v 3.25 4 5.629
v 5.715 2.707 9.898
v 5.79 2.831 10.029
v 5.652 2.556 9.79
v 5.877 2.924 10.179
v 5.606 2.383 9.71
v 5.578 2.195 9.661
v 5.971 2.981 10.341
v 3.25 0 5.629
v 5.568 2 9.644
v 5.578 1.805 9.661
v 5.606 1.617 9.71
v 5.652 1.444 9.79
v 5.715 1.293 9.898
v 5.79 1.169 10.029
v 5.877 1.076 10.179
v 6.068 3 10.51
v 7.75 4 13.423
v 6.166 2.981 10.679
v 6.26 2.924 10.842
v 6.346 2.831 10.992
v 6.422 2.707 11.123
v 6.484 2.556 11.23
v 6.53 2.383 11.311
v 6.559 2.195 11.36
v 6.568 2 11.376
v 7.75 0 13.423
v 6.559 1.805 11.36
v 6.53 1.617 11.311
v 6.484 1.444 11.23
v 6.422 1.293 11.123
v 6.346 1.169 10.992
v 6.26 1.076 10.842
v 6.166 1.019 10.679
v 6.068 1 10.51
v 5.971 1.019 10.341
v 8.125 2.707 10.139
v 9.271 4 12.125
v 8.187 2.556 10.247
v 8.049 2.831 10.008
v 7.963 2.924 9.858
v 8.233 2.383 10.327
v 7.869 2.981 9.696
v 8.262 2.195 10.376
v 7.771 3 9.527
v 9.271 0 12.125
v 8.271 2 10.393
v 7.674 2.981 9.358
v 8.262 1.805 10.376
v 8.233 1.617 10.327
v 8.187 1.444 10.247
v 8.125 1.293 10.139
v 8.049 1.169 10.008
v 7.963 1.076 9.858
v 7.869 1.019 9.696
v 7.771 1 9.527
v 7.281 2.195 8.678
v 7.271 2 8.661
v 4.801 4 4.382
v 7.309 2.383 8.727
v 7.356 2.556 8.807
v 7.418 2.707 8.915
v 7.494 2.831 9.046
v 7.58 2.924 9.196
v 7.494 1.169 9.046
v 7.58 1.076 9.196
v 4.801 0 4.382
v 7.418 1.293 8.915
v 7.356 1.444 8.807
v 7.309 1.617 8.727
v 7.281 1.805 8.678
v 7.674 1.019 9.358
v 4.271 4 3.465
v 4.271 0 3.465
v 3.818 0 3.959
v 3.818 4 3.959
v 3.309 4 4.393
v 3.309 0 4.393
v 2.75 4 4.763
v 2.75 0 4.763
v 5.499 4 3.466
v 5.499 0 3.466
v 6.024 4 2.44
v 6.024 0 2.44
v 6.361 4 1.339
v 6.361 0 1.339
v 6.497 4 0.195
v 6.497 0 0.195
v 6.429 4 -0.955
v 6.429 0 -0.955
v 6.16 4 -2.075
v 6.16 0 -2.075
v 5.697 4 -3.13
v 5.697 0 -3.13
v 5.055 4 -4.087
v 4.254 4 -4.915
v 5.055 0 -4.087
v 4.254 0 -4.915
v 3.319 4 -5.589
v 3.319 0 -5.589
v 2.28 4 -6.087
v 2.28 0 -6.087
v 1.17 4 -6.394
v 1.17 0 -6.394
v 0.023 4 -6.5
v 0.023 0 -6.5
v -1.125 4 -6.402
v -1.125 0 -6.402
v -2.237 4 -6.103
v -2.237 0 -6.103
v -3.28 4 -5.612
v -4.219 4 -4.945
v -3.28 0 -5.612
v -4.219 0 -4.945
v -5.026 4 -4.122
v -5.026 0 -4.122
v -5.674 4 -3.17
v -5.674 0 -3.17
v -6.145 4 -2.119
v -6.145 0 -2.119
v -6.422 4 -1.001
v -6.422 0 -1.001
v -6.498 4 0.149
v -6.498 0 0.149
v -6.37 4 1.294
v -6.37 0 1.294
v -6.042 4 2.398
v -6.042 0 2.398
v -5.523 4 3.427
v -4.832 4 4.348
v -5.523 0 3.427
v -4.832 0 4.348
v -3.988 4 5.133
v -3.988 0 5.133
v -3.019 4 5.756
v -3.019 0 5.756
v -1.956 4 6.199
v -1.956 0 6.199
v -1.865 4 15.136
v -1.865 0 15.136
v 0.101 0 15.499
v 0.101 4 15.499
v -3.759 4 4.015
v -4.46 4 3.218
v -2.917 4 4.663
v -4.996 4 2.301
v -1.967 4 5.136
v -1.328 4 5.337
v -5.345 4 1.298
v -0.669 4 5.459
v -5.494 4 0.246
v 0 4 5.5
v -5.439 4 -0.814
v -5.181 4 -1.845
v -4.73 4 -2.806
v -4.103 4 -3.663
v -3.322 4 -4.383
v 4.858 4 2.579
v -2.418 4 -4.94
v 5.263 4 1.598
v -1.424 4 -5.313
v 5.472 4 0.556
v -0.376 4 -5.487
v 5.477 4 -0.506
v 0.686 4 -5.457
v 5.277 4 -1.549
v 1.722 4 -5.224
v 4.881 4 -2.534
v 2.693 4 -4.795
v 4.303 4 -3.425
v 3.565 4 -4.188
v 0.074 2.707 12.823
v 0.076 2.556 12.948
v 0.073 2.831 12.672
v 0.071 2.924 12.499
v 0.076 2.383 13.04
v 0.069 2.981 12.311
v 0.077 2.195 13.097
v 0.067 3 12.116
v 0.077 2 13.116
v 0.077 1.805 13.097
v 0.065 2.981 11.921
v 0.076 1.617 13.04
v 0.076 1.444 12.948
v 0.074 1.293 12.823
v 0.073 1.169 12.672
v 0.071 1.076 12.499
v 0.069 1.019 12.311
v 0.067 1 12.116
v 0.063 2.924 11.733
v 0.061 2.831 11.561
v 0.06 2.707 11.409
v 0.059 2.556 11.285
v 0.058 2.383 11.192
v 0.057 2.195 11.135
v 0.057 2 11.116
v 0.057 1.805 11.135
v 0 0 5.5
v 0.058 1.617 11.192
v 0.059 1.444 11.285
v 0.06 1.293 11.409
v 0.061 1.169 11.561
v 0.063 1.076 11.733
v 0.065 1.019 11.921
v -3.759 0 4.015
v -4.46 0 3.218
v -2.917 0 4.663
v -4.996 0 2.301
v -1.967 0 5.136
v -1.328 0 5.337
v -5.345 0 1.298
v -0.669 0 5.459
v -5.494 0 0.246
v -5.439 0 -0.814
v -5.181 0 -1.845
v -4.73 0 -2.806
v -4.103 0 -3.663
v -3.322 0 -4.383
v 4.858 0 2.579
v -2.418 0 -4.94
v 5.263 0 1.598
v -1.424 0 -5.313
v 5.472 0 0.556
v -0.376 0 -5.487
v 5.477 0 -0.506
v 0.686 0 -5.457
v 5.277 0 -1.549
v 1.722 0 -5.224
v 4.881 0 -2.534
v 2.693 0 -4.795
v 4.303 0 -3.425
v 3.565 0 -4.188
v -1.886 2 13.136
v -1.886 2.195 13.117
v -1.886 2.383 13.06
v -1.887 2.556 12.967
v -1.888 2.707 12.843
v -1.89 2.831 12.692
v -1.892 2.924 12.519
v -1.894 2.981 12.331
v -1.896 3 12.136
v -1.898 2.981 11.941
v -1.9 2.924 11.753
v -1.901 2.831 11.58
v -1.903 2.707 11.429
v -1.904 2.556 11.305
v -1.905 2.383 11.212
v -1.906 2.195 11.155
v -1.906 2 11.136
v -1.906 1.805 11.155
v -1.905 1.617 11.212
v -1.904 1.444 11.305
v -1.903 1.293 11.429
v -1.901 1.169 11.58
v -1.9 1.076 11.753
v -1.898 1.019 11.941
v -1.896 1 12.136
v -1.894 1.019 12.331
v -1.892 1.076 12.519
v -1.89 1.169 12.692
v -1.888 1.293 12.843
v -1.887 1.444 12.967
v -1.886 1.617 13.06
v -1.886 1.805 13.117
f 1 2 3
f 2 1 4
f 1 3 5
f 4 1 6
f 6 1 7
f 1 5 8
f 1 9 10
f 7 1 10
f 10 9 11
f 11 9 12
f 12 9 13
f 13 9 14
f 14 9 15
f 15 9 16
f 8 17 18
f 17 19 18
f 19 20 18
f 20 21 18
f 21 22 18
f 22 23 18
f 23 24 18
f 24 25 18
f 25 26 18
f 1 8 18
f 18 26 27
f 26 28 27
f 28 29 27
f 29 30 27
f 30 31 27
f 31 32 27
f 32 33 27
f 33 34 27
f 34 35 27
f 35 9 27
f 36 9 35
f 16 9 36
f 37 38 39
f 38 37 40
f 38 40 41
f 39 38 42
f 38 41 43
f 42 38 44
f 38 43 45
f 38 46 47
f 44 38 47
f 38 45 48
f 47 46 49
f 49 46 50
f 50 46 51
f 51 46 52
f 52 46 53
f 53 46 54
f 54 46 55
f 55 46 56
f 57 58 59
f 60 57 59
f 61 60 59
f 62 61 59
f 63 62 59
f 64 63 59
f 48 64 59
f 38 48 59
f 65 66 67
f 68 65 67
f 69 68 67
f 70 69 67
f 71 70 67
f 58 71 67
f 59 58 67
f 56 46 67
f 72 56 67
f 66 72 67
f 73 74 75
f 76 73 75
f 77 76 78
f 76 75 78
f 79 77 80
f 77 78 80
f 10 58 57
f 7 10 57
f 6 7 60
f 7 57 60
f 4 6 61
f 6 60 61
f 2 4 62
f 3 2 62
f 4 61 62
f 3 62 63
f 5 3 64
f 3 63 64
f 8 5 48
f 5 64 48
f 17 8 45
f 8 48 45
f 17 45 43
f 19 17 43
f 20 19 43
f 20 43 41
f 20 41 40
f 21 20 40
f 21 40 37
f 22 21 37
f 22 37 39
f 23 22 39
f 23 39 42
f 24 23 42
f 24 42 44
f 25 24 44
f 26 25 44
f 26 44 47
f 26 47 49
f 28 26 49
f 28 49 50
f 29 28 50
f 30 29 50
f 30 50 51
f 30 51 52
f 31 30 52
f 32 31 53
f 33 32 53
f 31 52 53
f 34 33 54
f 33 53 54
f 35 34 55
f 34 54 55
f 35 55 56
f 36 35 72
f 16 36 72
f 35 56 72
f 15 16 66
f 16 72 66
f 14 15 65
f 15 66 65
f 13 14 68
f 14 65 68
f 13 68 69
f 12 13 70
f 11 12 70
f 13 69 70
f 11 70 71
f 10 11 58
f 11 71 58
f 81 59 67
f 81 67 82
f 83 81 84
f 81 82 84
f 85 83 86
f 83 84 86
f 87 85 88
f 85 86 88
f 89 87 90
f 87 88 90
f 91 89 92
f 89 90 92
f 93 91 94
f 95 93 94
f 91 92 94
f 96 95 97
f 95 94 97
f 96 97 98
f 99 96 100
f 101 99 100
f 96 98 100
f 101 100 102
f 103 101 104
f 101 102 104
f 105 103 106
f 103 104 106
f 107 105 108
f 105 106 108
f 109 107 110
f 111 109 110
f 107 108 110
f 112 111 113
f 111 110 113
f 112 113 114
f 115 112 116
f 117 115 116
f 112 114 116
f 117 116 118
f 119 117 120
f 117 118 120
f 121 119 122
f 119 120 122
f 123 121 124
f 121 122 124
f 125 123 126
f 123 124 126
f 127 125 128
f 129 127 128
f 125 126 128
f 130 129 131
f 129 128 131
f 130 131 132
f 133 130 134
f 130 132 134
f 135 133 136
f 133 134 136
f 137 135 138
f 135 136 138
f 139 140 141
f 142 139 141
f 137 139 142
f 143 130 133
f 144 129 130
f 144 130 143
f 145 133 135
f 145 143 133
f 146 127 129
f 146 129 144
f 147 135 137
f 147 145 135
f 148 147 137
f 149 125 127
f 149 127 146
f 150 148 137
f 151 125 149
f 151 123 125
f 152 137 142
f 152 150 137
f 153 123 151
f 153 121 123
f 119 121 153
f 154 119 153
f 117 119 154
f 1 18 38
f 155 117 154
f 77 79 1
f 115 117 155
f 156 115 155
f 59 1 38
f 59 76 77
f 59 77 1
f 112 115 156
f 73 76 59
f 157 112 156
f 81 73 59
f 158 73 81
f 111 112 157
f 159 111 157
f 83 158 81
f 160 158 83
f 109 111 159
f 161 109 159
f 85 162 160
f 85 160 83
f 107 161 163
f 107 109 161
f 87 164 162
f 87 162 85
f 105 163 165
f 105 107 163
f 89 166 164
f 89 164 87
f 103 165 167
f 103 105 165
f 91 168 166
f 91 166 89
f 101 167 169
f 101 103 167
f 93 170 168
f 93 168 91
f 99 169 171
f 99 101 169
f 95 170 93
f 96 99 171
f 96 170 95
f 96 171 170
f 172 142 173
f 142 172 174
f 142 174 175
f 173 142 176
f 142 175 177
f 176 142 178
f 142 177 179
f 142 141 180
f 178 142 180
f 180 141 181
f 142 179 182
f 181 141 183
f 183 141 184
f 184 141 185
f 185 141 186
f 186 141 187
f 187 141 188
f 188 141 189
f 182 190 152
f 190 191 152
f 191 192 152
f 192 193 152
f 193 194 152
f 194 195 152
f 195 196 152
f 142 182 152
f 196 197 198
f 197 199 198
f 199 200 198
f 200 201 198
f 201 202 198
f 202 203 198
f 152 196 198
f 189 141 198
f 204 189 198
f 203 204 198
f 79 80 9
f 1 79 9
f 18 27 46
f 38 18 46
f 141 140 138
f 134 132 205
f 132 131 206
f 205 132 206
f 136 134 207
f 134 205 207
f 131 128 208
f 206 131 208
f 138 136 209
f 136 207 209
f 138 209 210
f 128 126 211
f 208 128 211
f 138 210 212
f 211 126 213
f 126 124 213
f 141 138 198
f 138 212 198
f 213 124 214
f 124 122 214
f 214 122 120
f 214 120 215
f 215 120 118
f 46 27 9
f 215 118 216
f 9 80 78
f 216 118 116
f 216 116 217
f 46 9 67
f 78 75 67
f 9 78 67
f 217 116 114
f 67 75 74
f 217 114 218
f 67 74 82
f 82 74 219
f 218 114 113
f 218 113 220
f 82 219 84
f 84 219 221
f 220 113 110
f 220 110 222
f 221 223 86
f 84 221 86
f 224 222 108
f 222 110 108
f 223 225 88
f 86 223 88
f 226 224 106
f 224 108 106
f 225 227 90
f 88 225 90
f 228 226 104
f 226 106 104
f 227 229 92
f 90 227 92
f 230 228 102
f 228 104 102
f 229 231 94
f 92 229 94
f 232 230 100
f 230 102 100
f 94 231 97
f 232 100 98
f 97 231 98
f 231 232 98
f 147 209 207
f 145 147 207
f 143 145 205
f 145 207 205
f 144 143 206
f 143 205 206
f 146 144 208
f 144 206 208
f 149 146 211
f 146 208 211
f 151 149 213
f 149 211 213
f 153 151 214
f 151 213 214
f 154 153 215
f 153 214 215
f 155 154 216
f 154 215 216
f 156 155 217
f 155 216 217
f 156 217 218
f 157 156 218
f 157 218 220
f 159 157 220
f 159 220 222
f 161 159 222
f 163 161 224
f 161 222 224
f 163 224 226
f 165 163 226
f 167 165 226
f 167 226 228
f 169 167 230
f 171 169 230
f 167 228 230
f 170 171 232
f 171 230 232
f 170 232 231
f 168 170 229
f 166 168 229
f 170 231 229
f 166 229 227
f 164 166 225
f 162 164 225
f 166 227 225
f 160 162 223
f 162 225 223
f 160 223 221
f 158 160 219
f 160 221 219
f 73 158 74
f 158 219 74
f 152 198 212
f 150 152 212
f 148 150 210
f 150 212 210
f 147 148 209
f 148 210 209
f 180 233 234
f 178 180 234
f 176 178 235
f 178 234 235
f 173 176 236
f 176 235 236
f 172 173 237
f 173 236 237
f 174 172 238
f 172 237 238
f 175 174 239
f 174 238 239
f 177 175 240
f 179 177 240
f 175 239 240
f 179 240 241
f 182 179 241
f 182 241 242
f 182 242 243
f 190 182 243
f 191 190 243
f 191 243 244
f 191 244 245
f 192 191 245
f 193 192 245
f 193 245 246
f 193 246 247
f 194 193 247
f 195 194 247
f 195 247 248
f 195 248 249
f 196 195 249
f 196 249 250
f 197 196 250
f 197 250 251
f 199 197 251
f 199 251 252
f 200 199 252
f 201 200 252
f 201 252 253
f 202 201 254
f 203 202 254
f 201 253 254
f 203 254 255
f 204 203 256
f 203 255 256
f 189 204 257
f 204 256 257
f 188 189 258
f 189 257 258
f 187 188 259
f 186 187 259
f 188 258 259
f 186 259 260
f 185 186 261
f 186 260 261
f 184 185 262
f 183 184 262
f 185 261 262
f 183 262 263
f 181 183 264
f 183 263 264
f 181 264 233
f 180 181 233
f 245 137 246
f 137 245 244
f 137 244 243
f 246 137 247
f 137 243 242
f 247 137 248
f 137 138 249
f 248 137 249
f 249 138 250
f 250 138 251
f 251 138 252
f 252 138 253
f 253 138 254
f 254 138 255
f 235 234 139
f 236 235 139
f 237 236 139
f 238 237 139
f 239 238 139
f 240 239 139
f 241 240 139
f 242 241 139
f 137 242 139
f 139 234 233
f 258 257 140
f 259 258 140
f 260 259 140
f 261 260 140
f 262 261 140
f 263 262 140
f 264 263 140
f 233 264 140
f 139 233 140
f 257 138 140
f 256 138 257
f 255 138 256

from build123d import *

# Parameters (mm, degrees)
BOSS_EXTRUDE1_DEPTH = 4
CUT_EXTRUDE1_REACH  = 21.572
SKETCH3_R           = 1
CUT_EXTRUDE2_REACH  = 20.841
SKETCH5_R           = 1


with BuildPart() as part:
    # Sketch2 → Boss-Extrude1 (new body)
    with BuildSketch(Plane(origin=(0, 0, 0), x_dir=(1, 0, 0), z_dir=(0, 1, 0))):
        with BuildLine():
            Line((-1.955885444, -6.198750852), (-1.966664332, -5.136363636))
            ThreePointArc((-1.966664332, -5.136363636), (-1.423504748, 5.312592045), (4.27136309, -3.464889226))
            Line((4.27136309, -3.464889226), (4.800851018, -4.381989218))
            ThreePointArc((4.800851018, -4.381989218), (-1.687783454, 6.277052414), (-1.955885444, -6.198750852))
        make_face()
        with BuildLine():
            Line((0, -6.5), (0, -5.5))
            ThreePointArc((0, -5.5), (-1, -5.408326913), (-1.966664332, -5.136363636))
            Line((-1.966664332, -5.136363636), (-1.955885444, -6.198750852))
            ThreePointArc((-1.955885444, -6.198750852), (-0.989474472, -6.42424628), (0, -6.5))
        make_face()
        with BuildLine():
            ThreePointArc((4.27136309, -3.464889226), (3.57018886, -4.183748499), (2.75, -4.763139721))
            Line((2.75, -4.763139721), (3.25, -5.629165125))
            ThreePointArc((3.25, -5.629165125), (4.073439881, -5.065282572), (4.800851018, -4.381989218))
            Line((4.800851018, -4.381989218), (4.27136309, -3.464889226))
        make_face()
        with BuildLine():
            ThreePointArc((4.800851018, -4.381989218), (4.073439881, -5.065282572), (3.25, -5.629165125))
            Line((3.25, -5.629165125), (7.75, -13.423393759))
            Line((7.75, -13.423393759), (9.27136309, -12.125143264))
            Line((9.27136309, -12.125143264), (4.800851018, -4.381989218))
        make_face()
        with BuildLine():
            Line((0.101453905, -15.499485342), (0, -5.5))
            Line((0, -5.5), (0, -6.5))
            ThreePointArc((0, -6.5), (-0.989474472, -6.42424628), (-1.955885444, -6.198750852))
            Line((-1.955885444, -6.198750852), (-1.865210427, -15.135848978))
            Line((-1.865210427, -15.135848978), (0.101453905, -15.499485342))
        make_face()
    extrude(amount=BOSS_EXTRUDE1_DEPTH)

    # Sketch3 → Cut-Extrude1 (cut, up to next)
    with BuildSketch(Plane(origin=(-2.018569638, 0, 0.020480231), x_dir=(0.010145390476883202, 0, 0.9999485342016716), z_dir=(-0.9999485342016717, 0, 0.010145390476883204)), mode=Mode.PRIVATE) as cut_extrude1_sk1:
        with Locations((12.116146712, 2)):
            Circle(SKETCH3_R)
    cut_extrude1_tool1 = extrude(cut_extrude1_sk1.sketch, amount=-CUT_EXTRUDE1_REACH, mode=Mode.PRIVATE) & part.part
    add(cut_extrude1_tool1.solids().sort_by_distance((-1.895647, 2, 12.136003))[0], mode=Mode.SUBTRACT)

    # Sketch5 → Cut-Extrude2 (cut, up to next)
    with BuildSketch(Plane(origin=(1.703181272, 0, -0.983332166), x_dir=(-0.5000000000000019, 0, -0.8660254037844377), z_dir=(0.8660254037844377, 0, -0.5000000000000019)), mode=Mode.PRIVATE) as cut_extrude2_sk1:
        with Locations((-12.136363636, 2)):
            Circle(SKETCH5_R)
    cut_extrude2_tool1 = extrude(cut_extrude2_sk1.sketch, amount=-CUT_EXTRUDE2_REACH, mode=Mode.PRIVATE) & part.part
    add(cut_extrude2_tool1.solids().sort_by_distance((7.771363, 2, 9.527067))[0], mode=Mode.SUBTRACT)


solid = part.part
